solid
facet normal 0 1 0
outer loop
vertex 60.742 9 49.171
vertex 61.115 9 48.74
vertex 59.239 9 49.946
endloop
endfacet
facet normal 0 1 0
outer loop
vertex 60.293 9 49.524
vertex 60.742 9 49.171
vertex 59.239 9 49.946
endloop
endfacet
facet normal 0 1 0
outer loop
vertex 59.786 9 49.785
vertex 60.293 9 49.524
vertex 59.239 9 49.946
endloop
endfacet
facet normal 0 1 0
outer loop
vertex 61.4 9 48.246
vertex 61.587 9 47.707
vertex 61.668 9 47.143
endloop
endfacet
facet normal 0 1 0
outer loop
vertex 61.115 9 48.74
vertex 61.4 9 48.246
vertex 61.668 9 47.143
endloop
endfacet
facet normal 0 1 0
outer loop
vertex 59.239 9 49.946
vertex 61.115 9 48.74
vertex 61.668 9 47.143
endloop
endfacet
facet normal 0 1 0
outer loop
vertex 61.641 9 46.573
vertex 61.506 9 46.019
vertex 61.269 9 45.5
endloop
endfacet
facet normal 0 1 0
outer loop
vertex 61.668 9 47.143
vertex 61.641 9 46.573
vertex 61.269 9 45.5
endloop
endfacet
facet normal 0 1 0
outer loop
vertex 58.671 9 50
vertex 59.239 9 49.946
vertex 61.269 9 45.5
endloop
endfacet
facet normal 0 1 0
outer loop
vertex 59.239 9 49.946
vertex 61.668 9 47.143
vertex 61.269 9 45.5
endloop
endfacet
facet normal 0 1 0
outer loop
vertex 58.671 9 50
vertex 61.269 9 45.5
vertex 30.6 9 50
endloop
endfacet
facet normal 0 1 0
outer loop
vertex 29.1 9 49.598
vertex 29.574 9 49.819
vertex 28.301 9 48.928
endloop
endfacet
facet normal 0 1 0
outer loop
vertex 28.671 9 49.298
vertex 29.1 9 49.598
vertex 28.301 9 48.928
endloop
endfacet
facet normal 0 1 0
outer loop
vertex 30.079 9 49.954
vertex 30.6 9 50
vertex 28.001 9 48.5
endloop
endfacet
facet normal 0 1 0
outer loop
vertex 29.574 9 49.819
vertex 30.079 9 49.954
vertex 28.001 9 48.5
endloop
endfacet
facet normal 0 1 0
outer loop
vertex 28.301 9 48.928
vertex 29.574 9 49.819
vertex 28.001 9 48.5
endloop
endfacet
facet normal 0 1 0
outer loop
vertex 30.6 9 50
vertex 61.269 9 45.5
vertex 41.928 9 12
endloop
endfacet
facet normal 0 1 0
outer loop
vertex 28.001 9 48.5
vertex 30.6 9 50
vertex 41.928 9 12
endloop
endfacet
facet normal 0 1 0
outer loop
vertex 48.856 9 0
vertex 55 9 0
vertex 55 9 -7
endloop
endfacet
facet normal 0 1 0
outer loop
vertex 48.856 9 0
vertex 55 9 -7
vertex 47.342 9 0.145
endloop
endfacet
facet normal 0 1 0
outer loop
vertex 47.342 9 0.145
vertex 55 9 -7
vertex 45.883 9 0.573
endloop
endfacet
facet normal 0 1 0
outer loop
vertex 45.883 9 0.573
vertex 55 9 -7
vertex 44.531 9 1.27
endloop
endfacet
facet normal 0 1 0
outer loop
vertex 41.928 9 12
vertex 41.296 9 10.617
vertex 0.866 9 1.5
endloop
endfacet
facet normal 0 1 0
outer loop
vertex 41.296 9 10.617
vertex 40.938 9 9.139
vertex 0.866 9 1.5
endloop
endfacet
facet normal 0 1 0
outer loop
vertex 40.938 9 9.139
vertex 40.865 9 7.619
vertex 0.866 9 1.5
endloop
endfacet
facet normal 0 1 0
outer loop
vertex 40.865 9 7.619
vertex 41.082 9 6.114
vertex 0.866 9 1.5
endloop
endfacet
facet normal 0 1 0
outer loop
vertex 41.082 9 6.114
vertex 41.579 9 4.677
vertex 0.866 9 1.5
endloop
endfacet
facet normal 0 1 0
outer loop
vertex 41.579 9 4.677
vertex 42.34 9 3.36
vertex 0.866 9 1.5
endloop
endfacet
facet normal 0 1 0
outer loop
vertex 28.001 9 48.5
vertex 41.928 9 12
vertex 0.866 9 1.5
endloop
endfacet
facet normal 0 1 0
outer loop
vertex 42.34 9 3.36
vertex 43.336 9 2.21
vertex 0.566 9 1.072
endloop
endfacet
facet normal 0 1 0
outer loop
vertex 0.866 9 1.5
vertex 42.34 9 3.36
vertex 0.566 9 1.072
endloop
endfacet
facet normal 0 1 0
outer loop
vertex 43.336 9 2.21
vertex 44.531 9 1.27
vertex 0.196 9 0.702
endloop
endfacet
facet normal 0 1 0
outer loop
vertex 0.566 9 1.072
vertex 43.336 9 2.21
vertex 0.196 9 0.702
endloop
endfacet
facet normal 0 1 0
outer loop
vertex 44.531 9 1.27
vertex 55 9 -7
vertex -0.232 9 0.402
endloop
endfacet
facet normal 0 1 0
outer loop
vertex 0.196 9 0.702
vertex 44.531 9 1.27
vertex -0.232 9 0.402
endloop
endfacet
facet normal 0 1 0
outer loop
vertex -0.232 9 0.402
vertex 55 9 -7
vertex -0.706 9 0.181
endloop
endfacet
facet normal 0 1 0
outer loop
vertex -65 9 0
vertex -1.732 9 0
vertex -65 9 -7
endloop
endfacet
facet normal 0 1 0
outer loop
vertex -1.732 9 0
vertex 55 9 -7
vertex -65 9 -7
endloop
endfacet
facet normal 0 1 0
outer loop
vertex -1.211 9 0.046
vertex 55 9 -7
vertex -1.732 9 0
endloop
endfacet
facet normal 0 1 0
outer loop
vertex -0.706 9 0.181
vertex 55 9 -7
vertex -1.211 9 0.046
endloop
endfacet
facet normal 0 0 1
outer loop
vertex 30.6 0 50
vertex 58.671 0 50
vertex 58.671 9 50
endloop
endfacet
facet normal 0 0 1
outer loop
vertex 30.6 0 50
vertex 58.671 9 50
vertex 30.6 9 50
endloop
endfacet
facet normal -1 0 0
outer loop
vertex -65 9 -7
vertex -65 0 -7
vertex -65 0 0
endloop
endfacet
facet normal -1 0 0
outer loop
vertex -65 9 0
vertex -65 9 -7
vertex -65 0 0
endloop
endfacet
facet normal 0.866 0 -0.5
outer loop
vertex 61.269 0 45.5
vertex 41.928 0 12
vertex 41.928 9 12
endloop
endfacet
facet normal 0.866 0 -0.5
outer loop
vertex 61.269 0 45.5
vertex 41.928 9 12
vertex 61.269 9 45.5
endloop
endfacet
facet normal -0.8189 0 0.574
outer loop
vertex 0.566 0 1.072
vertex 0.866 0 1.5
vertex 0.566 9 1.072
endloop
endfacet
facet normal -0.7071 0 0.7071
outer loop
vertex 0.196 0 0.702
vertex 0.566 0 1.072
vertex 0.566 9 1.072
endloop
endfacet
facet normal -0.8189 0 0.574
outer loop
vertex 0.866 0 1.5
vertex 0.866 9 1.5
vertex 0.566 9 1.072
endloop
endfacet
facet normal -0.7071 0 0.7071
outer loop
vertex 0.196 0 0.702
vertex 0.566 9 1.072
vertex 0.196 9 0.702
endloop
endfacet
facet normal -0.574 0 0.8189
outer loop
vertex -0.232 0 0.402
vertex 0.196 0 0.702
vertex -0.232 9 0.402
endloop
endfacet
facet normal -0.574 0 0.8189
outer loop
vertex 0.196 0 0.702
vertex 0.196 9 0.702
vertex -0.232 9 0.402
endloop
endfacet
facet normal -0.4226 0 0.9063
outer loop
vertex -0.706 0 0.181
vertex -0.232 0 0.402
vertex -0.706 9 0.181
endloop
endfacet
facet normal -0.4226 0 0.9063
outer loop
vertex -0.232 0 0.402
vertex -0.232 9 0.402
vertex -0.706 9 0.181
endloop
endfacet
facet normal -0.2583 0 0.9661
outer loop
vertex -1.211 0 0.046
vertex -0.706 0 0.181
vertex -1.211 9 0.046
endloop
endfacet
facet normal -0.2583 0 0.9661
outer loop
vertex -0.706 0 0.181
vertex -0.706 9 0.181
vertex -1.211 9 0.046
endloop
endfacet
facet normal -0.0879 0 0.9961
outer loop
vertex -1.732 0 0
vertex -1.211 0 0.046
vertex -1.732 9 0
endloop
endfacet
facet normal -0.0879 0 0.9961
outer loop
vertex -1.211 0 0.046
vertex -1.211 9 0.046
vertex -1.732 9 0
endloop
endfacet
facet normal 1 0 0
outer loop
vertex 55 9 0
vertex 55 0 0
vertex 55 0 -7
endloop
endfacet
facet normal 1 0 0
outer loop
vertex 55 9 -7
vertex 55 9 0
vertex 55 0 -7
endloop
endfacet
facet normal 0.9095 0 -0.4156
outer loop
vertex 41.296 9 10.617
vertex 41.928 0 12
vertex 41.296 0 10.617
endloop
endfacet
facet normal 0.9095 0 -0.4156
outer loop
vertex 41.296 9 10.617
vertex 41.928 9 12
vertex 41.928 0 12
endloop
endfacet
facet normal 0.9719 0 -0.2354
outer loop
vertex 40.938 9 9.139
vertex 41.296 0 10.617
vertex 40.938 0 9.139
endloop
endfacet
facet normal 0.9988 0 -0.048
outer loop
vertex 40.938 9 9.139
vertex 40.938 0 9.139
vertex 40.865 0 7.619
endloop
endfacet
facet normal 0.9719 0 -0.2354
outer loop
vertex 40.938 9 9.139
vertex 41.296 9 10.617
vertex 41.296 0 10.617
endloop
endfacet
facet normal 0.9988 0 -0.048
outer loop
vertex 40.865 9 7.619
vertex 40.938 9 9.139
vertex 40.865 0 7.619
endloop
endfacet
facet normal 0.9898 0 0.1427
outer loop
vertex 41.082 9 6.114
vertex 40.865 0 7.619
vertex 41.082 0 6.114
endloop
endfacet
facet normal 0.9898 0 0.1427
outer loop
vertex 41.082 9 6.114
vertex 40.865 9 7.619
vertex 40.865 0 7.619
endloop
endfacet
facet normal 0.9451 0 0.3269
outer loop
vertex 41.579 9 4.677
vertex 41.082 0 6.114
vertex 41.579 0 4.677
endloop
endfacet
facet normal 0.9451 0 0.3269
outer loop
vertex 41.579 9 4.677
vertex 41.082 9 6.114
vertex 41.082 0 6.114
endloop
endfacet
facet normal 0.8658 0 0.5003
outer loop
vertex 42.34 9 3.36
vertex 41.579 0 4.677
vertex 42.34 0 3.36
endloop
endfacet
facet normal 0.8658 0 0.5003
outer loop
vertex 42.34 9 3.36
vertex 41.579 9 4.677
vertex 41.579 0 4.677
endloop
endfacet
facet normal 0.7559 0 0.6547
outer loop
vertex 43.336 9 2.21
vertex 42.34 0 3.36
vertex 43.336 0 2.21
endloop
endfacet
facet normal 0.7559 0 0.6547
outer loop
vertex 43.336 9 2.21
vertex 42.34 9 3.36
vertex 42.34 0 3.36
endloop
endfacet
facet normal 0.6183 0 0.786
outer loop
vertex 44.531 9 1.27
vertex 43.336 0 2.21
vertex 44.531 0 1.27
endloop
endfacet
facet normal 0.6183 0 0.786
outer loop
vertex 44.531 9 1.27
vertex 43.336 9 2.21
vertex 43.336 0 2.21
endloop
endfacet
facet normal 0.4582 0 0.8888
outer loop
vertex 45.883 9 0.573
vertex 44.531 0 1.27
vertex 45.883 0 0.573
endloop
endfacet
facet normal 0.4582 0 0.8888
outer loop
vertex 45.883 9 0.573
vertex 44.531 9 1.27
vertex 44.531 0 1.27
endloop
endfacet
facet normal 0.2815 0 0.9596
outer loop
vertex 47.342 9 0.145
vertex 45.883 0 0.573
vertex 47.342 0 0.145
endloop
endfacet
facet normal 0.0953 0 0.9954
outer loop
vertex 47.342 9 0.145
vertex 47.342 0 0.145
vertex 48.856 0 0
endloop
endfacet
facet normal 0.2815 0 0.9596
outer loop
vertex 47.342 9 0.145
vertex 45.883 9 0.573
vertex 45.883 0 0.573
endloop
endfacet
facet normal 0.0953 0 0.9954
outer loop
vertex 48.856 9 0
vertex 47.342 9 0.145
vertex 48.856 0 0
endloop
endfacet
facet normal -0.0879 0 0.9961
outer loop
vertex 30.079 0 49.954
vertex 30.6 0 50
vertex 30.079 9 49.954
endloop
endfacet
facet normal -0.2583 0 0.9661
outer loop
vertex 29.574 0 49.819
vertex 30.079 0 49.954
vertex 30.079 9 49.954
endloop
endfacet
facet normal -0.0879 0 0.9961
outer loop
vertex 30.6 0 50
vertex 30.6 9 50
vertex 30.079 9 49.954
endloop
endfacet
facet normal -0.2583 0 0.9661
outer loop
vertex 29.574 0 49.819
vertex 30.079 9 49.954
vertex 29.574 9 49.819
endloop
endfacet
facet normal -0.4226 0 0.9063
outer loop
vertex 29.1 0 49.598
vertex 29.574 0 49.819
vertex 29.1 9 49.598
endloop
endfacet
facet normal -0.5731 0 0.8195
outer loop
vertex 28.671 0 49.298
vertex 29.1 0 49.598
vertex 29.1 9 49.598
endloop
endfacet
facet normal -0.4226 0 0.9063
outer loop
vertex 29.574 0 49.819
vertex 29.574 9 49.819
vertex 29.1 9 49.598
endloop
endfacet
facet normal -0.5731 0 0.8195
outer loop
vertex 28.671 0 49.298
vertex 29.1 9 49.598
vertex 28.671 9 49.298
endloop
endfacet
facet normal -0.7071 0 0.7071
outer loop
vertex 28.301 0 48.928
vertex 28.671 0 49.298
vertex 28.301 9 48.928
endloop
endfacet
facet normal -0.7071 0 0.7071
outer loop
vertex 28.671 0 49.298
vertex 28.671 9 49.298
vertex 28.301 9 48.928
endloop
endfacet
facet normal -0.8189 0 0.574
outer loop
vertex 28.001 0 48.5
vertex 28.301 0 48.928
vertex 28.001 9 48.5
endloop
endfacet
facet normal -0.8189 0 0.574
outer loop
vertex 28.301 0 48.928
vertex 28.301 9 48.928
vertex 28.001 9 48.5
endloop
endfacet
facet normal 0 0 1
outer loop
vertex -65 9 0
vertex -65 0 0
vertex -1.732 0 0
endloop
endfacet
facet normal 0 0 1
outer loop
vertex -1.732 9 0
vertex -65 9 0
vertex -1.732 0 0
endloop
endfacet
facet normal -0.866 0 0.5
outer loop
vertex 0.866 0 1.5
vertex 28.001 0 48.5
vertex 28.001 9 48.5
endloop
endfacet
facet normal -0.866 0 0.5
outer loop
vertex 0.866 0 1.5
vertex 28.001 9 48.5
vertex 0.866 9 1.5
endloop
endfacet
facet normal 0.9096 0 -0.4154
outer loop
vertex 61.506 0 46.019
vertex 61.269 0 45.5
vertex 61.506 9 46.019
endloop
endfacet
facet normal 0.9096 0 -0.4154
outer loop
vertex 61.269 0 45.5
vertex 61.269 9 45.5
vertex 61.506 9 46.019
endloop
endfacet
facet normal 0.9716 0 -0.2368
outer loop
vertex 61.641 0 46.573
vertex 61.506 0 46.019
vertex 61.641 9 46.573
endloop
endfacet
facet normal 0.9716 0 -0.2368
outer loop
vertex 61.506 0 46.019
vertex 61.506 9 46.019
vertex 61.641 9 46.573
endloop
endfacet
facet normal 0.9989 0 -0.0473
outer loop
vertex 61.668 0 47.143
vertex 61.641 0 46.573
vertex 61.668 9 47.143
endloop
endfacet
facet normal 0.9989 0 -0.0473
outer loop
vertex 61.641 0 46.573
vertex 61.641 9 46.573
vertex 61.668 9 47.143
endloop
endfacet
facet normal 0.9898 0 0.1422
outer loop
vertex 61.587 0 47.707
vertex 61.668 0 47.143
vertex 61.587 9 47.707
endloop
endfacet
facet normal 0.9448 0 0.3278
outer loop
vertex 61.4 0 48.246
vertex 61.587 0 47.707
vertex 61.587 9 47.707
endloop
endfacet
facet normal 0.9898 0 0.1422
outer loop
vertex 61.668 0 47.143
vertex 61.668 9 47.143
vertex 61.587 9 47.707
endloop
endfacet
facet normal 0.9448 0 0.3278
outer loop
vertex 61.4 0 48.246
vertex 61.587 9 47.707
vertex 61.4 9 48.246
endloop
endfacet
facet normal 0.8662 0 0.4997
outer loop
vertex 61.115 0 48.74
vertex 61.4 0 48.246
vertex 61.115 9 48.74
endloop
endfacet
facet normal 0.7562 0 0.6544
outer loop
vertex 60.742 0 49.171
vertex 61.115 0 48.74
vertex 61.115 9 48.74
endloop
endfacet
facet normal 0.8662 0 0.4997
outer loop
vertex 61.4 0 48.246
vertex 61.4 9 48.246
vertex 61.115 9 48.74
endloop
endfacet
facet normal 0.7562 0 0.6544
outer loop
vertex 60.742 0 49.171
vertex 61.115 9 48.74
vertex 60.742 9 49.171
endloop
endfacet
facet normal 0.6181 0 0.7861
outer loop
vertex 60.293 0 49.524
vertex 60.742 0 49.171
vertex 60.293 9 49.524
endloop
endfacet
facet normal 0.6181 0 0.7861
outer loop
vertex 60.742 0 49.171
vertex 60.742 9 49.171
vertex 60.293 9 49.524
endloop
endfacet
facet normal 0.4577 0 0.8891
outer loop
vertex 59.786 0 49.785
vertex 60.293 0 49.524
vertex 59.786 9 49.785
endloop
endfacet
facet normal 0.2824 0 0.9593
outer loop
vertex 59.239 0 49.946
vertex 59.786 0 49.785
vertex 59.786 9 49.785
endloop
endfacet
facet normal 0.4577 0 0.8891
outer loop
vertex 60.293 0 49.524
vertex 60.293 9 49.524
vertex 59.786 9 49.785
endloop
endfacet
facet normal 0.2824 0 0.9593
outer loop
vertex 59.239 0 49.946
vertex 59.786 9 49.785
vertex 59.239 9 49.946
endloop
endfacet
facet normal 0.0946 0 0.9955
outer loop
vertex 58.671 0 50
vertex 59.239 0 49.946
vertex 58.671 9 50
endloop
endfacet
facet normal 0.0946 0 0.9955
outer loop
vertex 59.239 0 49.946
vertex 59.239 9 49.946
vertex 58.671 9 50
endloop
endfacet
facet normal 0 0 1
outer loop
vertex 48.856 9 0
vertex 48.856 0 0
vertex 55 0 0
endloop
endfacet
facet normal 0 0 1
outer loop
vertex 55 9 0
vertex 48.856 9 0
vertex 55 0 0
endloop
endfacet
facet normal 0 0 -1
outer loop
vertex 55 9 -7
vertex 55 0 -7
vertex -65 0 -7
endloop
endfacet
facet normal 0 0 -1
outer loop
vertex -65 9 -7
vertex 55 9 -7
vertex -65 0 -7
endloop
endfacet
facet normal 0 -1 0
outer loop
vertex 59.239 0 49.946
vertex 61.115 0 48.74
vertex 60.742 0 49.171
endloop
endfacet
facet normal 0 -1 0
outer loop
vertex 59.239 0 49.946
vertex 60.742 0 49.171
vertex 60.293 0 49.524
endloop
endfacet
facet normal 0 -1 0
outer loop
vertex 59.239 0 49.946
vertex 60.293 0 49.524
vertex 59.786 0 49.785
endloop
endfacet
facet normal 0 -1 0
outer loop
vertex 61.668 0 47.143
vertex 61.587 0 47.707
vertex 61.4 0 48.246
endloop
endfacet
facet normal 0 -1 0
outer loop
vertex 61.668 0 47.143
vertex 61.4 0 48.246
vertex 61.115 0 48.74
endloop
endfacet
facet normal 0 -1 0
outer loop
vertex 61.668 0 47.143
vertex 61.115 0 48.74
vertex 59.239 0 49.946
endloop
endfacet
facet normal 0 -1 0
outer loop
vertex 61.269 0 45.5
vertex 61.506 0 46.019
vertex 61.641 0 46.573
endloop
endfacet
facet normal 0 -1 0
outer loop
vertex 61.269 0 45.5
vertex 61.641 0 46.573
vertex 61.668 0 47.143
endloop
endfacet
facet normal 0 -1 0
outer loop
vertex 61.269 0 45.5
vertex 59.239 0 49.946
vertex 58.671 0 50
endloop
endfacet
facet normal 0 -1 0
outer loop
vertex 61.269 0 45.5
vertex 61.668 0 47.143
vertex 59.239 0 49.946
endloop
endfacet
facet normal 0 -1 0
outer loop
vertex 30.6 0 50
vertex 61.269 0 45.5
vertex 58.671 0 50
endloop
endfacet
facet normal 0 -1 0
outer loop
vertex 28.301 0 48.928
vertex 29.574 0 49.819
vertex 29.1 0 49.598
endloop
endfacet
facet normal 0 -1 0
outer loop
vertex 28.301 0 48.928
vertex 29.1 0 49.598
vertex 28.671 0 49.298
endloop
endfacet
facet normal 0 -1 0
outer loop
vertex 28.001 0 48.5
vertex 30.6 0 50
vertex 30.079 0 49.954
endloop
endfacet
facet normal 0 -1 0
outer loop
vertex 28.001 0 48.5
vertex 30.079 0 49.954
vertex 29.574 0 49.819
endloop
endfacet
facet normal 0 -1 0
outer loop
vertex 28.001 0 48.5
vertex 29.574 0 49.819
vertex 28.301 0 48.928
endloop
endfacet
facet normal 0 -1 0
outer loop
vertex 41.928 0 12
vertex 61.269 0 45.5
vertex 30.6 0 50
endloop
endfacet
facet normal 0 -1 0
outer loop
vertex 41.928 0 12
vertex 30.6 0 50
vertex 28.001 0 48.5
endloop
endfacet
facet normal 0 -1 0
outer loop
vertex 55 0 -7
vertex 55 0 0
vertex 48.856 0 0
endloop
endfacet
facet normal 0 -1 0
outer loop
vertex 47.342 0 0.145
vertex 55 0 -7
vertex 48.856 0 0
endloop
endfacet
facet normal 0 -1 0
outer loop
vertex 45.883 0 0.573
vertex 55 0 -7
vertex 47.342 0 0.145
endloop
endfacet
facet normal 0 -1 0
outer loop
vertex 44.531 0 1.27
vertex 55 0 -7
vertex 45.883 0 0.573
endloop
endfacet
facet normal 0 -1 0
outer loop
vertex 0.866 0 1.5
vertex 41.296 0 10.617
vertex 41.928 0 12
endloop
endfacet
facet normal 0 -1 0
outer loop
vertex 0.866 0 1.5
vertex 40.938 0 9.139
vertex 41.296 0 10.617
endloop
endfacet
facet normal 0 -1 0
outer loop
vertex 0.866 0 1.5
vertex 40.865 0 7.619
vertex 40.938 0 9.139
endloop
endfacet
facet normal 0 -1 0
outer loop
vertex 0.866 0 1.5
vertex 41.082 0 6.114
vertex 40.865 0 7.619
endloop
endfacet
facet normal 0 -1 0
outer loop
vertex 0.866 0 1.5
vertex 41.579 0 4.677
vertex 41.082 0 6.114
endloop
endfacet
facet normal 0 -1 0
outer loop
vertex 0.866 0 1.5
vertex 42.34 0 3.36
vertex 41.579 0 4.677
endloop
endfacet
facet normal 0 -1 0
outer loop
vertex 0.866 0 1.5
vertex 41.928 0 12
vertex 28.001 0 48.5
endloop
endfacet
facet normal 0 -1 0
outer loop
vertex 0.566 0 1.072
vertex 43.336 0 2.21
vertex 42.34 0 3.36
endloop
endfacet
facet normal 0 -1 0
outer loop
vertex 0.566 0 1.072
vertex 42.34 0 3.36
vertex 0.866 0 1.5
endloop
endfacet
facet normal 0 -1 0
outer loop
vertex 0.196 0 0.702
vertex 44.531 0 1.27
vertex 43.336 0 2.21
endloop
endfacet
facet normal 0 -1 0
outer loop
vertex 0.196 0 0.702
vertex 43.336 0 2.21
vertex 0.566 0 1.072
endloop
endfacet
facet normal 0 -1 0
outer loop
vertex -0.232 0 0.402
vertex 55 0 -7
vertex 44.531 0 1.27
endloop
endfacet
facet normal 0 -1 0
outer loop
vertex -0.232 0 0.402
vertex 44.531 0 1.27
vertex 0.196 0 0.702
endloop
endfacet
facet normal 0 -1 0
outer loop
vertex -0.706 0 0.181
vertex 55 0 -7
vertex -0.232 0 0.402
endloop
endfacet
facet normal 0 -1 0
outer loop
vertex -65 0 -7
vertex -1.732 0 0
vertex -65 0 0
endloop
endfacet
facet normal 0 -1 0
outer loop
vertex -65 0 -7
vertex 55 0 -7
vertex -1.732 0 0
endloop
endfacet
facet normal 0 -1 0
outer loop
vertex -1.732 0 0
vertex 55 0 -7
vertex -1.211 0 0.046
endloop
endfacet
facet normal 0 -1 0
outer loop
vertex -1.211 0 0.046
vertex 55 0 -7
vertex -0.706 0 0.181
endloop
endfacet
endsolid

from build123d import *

# Parameters (mm, degrees)
BOSS_EXTRUDE1_DEPTH = 9
FILLET1_R           = 8
FILLET2_R           = 3


with BuildPart() as part:
    # Sketch1 → Boss-Extrude1 (new body)
    with BuildSketch(Plane(origin=(0, 0, 0), x_dir=(1, 0, 0), z_dir=(0, 1, 0))):
        Polygon((35, 0), (63.867513459, -50), (28.867513459, -50), (0, 0), align=None)
        Polygon((-65, 0), (0, 0), (35, 0), (55, 0), (55, 7), (-65, 7), align=None)
    extrude(amount=BOSS_EXTRUDE1_DEPTH)

    # Fillet1
    fillet1_edges = [part.edges().sort_by_distance(p)[0] for p in [
        (35, 4.5, 0),
    ]]
    fillet(fillet1_edges, radius=FILLET1_R)

    # Fillet2
    fillet2_edges = [part.edges().sort_by_distance(p)[0] for p in [
        (63.867513459, 4.5, 50),
        (28.867513459, 4.5, 50),
        (0, 4.5, 0),
    ]]
    fillet(fillet2_edges, radius=FILLET2_R)


solid = part.part
